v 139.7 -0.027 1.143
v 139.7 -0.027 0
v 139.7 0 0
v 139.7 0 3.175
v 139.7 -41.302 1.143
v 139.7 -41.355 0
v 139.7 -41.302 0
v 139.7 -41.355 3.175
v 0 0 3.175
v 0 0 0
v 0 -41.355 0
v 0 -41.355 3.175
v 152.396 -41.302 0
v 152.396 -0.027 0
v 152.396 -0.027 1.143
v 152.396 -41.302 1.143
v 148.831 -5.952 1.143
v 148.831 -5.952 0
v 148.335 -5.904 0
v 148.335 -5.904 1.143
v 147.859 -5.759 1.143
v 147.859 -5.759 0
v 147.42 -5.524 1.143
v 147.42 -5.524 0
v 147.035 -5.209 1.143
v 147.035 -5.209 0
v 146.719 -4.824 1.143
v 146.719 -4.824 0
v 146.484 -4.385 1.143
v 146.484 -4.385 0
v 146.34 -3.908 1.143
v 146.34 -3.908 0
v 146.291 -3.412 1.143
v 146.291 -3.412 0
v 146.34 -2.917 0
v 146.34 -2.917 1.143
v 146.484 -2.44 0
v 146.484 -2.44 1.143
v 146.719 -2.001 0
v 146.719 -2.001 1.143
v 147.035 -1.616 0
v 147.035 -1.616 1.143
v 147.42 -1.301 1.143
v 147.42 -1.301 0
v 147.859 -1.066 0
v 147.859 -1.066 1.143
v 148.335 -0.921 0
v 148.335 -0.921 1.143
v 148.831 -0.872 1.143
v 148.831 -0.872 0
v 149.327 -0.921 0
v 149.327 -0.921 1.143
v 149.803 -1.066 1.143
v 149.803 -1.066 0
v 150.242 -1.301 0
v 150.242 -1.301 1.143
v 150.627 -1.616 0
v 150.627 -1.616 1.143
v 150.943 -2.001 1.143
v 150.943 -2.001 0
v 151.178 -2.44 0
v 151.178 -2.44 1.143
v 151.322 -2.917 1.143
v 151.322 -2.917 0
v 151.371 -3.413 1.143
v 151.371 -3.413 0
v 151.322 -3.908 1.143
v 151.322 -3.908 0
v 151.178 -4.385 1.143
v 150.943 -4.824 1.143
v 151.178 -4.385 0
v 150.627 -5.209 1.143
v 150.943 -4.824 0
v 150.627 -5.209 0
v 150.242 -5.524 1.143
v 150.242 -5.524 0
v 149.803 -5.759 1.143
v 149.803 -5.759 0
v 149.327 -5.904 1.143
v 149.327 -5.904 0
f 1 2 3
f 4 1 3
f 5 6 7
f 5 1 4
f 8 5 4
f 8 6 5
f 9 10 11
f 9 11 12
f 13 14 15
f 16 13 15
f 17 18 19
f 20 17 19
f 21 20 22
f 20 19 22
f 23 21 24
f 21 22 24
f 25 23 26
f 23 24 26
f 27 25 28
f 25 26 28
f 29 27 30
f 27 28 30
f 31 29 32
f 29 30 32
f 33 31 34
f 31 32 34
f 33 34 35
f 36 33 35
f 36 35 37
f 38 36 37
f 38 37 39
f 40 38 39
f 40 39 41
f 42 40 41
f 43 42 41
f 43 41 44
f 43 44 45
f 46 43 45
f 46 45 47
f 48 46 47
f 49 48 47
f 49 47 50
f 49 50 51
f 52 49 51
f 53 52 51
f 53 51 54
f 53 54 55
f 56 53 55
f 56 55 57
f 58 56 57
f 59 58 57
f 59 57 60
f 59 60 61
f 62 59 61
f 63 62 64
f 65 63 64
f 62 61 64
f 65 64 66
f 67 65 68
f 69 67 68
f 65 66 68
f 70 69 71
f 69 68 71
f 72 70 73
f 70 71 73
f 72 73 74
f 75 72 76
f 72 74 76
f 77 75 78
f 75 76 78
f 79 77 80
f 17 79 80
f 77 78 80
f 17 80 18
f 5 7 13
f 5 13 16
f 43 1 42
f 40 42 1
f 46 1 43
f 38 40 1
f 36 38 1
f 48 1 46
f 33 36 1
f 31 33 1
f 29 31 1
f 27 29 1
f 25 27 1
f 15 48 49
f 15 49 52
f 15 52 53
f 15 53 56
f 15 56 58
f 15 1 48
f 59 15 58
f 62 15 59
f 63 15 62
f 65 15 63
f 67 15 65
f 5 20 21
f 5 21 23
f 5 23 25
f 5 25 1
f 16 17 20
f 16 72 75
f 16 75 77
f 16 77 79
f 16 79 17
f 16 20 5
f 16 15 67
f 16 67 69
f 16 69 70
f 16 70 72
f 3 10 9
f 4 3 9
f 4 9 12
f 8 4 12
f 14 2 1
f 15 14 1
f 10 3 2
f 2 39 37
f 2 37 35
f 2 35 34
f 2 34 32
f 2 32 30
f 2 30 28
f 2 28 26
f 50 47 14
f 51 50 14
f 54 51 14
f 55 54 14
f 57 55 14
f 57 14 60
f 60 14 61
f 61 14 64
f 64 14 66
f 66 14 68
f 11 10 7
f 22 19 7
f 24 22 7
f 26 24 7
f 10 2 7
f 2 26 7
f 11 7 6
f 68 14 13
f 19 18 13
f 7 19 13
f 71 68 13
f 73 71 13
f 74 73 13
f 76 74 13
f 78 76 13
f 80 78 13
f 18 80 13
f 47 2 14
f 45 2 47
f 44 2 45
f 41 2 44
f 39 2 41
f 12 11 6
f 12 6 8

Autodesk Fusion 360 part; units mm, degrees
box "BoxPrimitive1" add length 41.3548 width 139.7 height 3.175 placed x (0, -1, 0) y (1, 0, 0) z (0, 0, 1) at (0, 0, 0)
box "BoxPrimitive2" add length 41.275 width 29.6956 height 1.143 placed x (0, -1, 0) y (1, 0, 0) z (0, 0, 1) at (122.7007, -0.0274, 0)
hole "Hole1" at (148.831, -3.4125, 1.143) direction (0, 0, -1) diameter 5.08 depth 15.24 tip angle 180
